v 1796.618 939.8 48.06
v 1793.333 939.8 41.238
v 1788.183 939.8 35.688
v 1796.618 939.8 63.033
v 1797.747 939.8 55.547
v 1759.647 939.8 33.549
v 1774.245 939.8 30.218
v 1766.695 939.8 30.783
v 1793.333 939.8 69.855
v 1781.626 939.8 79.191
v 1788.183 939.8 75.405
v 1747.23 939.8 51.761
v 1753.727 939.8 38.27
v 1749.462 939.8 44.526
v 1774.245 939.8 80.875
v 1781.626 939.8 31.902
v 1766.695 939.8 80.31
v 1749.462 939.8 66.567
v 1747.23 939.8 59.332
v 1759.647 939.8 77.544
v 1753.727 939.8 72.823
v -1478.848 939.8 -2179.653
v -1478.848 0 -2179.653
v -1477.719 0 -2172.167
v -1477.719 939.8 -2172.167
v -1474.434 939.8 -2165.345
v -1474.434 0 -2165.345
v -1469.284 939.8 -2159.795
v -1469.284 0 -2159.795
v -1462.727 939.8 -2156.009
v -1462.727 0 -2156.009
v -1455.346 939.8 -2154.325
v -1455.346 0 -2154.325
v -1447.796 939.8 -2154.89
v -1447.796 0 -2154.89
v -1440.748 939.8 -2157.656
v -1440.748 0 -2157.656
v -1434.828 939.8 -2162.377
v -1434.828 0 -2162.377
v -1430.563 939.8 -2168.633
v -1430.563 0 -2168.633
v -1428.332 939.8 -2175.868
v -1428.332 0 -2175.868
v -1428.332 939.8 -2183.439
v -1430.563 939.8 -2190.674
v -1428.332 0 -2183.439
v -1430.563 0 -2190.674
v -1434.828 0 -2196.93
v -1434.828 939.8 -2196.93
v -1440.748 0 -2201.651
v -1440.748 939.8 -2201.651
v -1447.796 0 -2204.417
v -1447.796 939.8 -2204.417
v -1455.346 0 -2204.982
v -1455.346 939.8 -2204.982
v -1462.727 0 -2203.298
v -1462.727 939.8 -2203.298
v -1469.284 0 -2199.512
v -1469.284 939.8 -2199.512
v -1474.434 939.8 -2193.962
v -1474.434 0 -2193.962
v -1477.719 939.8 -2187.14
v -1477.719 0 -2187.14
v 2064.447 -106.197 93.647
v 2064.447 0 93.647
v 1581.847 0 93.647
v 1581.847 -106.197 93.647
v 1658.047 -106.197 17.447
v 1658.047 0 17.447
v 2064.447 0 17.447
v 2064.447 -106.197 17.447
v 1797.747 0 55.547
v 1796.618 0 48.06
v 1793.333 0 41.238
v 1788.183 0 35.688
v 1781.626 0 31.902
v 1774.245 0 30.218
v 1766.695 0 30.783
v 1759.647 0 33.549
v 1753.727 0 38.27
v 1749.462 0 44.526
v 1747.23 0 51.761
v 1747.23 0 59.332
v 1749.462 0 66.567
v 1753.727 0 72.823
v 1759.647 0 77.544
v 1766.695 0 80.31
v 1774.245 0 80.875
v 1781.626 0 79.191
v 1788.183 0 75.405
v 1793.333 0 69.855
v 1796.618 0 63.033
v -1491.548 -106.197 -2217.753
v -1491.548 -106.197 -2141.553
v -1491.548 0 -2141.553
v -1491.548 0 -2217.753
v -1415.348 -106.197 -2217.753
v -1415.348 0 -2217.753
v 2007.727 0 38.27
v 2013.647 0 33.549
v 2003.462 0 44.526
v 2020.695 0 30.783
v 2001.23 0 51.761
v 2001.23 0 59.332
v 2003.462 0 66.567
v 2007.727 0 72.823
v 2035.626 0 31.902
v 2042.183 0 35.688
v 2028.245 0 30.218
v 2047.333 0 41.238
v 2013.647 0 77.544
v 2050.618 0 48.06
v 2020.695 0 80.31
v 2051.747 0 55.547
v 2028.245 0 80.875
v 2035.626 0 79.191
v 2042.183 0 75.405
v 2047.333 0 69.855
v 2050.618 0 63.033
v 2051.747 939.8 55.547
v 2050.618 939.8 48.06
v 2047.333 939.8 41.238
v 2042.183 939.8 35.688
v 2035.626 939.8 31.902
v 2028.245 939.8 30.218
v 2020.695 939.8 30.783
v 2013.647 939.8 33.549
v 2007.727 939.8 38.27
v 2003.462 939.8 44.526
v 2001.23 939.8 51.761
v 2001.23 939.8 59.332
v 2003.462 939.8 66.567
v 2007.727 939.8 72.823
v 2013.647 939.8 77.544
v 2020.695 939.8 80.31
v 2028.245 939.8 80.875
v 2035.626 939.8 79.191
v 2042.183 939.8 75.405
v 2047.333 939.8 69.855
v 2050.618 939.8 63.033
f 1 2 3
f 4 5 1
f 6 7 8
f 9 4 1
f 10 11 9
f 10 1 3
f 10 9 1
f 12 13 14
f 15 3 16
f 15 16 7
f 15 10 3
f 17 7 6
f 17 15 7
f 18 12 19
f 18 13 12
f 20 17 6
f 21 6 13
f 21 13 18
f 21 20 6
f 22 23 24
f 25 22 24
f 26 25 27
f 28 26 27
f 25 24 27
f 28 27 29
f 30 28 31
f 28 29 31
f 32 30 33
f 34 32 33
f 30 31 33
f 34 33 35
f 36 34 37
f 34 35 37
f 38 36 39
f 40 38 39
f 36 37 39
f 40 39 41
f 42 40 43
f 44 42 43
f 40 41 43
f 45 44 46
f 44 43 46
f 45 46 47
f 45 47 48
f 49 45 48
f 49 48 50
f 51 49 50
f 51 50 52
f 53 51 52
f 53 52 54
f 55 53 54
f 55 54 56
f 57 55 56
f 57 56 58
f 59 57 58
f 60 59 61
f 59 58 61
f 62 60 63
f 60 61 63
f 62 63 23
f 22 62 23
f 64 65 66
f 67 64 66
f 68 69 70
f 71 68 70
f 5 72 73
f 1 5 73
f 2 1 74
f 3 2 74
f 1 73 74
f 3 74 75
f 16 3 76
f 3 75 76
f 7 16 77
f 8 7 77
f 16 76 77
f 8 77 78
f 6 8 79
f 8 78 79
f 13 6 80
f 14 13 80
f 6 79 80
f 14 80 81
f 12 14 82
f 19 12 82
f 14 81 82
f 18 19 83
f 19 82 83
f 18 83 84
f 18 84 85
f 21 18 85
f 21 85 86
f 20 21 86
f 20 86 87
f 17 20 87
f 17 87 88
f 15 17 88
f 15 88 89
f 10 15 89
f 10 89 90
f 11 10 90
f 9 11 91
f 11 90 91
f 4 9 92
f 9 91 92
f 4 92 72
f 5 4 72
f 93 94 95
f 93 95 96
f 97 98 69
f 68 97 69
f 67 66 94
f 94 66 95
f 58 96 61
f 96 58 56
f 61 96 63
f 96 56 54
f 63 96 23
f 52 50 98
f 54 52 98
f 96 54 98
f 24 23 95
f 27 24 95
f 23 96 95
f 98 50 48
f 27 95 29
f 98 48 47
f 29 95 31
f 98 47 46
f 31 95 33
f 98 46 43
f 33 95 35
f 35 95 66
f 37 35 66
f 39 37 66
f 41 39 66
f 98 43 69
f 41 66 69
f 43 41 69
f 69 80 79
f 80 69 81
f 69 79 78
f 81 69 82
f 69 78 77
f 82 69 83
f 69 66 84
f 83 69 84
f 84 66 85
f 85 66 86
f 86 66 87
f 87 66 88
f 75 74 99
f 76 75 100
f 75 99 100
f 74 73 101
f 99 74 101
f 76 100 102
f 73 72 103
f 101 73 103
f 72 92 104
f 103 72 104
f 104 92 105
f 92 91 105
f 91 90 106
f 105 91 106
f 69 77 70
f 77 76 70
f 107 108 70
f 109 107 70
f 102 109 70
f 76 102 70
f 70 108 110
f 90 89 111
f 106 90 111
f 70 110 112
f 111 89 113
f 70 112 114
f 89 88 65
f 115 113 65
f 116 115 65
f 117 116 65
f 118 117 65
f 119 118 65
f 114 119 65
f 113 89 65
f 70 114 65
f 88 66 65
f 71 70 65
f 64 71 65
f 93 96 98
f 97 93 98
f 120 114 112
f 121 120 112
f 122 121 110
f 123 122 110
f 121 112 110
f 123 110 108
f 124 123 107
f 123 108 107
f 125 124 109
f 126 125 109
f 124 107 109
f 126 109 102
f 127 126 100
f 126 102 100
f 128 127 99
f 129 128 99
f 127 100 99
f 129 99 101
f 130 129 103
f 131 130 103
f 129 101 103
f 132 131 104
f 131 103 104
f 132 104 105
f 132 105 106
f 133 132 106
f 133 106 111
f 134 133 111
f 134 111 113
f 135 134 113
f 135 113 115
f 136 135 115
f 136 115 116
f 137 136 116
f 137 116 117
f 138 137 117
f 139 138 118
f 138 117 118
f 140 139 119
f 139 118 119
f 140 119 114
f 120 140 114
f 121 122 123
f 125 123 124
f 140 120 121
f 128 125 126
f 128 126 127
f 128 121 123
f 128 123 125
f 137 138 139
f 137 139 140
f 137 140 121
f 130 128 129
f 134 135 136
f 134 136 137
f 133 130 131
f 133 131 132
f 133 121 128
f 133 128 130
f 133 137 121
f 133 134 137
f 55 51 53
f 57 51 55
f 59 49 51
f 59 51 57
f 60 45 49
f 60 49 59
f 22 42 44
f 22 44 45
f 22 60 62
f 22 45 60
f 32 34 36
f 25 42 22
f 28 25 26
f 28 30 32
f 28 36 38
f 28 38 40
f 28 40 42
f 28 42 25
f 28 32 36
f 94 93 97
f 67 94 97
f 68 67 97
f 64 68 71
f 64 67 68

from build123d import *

# Parameters (mm, degrees)
F1_DEPTH = 106.1974
F2_R     = 25.4
F3_DEPTH = 939.8


with BuildPart() as f1:
    # F0 (on Front) → F1 (new body)
    with BuildSketch(Plane.XZ):
        Polygon((2064.44667, 17.446511), (2064.44667, 93.646511), (1581.84667, 93.646511), (-1491.547815, -2141.553489), (-1491.547815, -2217.753489), (-1415.347815, -2217.753489), (1658.04667, 17.446511), align=None)
    extrude(amount=F1_DEPTH)

    # F2 (on face) → F3 (join)
    with BuildSketch(Plane(origin=(0, 0, 0), x_dir=(-1, 0, 0), z_dir=(0, 1, 0))):
        with BuildLine():
            ThreePointArc((-1746.94667, 55.546511), (-1772.34667, 80.946511), (-1797.74667, 55.546511))
            ThreePointArc((-1797.74667, 55.546511), (-1772.34667, 30.146511), (-1746.94667, 55.546511))
        make_face()
        with BuildLine():
            ThreePointArc((-2000.94667, 55.546511), (-2026.34667, 80.946511), (-2051.74667, 55.546511))
            Line((-2051.74667, 55.546511), (-2026.34667, 55.546511))
            Line((-2026.34667, 55.546511), (-2000.94667, 55.546511))
        make_face()
        with BuildLine():
            Line((-2026.34667, 55.546511), (-2051.74667, 55.546511))
            ThreePointArc((-2051.74667, 55.546511), (-2026.34667, 30.146511), (-2000.94667, 55.546511))
            Line((-2000.94667, 55.546511), (-2026.34667, 55.546511))
        make_face()
        with Locations((1453.447815, -2179.653489)):
            Circle(F2_R)
    extrude(amount=F3_DEPTH)


solid = f1.part
